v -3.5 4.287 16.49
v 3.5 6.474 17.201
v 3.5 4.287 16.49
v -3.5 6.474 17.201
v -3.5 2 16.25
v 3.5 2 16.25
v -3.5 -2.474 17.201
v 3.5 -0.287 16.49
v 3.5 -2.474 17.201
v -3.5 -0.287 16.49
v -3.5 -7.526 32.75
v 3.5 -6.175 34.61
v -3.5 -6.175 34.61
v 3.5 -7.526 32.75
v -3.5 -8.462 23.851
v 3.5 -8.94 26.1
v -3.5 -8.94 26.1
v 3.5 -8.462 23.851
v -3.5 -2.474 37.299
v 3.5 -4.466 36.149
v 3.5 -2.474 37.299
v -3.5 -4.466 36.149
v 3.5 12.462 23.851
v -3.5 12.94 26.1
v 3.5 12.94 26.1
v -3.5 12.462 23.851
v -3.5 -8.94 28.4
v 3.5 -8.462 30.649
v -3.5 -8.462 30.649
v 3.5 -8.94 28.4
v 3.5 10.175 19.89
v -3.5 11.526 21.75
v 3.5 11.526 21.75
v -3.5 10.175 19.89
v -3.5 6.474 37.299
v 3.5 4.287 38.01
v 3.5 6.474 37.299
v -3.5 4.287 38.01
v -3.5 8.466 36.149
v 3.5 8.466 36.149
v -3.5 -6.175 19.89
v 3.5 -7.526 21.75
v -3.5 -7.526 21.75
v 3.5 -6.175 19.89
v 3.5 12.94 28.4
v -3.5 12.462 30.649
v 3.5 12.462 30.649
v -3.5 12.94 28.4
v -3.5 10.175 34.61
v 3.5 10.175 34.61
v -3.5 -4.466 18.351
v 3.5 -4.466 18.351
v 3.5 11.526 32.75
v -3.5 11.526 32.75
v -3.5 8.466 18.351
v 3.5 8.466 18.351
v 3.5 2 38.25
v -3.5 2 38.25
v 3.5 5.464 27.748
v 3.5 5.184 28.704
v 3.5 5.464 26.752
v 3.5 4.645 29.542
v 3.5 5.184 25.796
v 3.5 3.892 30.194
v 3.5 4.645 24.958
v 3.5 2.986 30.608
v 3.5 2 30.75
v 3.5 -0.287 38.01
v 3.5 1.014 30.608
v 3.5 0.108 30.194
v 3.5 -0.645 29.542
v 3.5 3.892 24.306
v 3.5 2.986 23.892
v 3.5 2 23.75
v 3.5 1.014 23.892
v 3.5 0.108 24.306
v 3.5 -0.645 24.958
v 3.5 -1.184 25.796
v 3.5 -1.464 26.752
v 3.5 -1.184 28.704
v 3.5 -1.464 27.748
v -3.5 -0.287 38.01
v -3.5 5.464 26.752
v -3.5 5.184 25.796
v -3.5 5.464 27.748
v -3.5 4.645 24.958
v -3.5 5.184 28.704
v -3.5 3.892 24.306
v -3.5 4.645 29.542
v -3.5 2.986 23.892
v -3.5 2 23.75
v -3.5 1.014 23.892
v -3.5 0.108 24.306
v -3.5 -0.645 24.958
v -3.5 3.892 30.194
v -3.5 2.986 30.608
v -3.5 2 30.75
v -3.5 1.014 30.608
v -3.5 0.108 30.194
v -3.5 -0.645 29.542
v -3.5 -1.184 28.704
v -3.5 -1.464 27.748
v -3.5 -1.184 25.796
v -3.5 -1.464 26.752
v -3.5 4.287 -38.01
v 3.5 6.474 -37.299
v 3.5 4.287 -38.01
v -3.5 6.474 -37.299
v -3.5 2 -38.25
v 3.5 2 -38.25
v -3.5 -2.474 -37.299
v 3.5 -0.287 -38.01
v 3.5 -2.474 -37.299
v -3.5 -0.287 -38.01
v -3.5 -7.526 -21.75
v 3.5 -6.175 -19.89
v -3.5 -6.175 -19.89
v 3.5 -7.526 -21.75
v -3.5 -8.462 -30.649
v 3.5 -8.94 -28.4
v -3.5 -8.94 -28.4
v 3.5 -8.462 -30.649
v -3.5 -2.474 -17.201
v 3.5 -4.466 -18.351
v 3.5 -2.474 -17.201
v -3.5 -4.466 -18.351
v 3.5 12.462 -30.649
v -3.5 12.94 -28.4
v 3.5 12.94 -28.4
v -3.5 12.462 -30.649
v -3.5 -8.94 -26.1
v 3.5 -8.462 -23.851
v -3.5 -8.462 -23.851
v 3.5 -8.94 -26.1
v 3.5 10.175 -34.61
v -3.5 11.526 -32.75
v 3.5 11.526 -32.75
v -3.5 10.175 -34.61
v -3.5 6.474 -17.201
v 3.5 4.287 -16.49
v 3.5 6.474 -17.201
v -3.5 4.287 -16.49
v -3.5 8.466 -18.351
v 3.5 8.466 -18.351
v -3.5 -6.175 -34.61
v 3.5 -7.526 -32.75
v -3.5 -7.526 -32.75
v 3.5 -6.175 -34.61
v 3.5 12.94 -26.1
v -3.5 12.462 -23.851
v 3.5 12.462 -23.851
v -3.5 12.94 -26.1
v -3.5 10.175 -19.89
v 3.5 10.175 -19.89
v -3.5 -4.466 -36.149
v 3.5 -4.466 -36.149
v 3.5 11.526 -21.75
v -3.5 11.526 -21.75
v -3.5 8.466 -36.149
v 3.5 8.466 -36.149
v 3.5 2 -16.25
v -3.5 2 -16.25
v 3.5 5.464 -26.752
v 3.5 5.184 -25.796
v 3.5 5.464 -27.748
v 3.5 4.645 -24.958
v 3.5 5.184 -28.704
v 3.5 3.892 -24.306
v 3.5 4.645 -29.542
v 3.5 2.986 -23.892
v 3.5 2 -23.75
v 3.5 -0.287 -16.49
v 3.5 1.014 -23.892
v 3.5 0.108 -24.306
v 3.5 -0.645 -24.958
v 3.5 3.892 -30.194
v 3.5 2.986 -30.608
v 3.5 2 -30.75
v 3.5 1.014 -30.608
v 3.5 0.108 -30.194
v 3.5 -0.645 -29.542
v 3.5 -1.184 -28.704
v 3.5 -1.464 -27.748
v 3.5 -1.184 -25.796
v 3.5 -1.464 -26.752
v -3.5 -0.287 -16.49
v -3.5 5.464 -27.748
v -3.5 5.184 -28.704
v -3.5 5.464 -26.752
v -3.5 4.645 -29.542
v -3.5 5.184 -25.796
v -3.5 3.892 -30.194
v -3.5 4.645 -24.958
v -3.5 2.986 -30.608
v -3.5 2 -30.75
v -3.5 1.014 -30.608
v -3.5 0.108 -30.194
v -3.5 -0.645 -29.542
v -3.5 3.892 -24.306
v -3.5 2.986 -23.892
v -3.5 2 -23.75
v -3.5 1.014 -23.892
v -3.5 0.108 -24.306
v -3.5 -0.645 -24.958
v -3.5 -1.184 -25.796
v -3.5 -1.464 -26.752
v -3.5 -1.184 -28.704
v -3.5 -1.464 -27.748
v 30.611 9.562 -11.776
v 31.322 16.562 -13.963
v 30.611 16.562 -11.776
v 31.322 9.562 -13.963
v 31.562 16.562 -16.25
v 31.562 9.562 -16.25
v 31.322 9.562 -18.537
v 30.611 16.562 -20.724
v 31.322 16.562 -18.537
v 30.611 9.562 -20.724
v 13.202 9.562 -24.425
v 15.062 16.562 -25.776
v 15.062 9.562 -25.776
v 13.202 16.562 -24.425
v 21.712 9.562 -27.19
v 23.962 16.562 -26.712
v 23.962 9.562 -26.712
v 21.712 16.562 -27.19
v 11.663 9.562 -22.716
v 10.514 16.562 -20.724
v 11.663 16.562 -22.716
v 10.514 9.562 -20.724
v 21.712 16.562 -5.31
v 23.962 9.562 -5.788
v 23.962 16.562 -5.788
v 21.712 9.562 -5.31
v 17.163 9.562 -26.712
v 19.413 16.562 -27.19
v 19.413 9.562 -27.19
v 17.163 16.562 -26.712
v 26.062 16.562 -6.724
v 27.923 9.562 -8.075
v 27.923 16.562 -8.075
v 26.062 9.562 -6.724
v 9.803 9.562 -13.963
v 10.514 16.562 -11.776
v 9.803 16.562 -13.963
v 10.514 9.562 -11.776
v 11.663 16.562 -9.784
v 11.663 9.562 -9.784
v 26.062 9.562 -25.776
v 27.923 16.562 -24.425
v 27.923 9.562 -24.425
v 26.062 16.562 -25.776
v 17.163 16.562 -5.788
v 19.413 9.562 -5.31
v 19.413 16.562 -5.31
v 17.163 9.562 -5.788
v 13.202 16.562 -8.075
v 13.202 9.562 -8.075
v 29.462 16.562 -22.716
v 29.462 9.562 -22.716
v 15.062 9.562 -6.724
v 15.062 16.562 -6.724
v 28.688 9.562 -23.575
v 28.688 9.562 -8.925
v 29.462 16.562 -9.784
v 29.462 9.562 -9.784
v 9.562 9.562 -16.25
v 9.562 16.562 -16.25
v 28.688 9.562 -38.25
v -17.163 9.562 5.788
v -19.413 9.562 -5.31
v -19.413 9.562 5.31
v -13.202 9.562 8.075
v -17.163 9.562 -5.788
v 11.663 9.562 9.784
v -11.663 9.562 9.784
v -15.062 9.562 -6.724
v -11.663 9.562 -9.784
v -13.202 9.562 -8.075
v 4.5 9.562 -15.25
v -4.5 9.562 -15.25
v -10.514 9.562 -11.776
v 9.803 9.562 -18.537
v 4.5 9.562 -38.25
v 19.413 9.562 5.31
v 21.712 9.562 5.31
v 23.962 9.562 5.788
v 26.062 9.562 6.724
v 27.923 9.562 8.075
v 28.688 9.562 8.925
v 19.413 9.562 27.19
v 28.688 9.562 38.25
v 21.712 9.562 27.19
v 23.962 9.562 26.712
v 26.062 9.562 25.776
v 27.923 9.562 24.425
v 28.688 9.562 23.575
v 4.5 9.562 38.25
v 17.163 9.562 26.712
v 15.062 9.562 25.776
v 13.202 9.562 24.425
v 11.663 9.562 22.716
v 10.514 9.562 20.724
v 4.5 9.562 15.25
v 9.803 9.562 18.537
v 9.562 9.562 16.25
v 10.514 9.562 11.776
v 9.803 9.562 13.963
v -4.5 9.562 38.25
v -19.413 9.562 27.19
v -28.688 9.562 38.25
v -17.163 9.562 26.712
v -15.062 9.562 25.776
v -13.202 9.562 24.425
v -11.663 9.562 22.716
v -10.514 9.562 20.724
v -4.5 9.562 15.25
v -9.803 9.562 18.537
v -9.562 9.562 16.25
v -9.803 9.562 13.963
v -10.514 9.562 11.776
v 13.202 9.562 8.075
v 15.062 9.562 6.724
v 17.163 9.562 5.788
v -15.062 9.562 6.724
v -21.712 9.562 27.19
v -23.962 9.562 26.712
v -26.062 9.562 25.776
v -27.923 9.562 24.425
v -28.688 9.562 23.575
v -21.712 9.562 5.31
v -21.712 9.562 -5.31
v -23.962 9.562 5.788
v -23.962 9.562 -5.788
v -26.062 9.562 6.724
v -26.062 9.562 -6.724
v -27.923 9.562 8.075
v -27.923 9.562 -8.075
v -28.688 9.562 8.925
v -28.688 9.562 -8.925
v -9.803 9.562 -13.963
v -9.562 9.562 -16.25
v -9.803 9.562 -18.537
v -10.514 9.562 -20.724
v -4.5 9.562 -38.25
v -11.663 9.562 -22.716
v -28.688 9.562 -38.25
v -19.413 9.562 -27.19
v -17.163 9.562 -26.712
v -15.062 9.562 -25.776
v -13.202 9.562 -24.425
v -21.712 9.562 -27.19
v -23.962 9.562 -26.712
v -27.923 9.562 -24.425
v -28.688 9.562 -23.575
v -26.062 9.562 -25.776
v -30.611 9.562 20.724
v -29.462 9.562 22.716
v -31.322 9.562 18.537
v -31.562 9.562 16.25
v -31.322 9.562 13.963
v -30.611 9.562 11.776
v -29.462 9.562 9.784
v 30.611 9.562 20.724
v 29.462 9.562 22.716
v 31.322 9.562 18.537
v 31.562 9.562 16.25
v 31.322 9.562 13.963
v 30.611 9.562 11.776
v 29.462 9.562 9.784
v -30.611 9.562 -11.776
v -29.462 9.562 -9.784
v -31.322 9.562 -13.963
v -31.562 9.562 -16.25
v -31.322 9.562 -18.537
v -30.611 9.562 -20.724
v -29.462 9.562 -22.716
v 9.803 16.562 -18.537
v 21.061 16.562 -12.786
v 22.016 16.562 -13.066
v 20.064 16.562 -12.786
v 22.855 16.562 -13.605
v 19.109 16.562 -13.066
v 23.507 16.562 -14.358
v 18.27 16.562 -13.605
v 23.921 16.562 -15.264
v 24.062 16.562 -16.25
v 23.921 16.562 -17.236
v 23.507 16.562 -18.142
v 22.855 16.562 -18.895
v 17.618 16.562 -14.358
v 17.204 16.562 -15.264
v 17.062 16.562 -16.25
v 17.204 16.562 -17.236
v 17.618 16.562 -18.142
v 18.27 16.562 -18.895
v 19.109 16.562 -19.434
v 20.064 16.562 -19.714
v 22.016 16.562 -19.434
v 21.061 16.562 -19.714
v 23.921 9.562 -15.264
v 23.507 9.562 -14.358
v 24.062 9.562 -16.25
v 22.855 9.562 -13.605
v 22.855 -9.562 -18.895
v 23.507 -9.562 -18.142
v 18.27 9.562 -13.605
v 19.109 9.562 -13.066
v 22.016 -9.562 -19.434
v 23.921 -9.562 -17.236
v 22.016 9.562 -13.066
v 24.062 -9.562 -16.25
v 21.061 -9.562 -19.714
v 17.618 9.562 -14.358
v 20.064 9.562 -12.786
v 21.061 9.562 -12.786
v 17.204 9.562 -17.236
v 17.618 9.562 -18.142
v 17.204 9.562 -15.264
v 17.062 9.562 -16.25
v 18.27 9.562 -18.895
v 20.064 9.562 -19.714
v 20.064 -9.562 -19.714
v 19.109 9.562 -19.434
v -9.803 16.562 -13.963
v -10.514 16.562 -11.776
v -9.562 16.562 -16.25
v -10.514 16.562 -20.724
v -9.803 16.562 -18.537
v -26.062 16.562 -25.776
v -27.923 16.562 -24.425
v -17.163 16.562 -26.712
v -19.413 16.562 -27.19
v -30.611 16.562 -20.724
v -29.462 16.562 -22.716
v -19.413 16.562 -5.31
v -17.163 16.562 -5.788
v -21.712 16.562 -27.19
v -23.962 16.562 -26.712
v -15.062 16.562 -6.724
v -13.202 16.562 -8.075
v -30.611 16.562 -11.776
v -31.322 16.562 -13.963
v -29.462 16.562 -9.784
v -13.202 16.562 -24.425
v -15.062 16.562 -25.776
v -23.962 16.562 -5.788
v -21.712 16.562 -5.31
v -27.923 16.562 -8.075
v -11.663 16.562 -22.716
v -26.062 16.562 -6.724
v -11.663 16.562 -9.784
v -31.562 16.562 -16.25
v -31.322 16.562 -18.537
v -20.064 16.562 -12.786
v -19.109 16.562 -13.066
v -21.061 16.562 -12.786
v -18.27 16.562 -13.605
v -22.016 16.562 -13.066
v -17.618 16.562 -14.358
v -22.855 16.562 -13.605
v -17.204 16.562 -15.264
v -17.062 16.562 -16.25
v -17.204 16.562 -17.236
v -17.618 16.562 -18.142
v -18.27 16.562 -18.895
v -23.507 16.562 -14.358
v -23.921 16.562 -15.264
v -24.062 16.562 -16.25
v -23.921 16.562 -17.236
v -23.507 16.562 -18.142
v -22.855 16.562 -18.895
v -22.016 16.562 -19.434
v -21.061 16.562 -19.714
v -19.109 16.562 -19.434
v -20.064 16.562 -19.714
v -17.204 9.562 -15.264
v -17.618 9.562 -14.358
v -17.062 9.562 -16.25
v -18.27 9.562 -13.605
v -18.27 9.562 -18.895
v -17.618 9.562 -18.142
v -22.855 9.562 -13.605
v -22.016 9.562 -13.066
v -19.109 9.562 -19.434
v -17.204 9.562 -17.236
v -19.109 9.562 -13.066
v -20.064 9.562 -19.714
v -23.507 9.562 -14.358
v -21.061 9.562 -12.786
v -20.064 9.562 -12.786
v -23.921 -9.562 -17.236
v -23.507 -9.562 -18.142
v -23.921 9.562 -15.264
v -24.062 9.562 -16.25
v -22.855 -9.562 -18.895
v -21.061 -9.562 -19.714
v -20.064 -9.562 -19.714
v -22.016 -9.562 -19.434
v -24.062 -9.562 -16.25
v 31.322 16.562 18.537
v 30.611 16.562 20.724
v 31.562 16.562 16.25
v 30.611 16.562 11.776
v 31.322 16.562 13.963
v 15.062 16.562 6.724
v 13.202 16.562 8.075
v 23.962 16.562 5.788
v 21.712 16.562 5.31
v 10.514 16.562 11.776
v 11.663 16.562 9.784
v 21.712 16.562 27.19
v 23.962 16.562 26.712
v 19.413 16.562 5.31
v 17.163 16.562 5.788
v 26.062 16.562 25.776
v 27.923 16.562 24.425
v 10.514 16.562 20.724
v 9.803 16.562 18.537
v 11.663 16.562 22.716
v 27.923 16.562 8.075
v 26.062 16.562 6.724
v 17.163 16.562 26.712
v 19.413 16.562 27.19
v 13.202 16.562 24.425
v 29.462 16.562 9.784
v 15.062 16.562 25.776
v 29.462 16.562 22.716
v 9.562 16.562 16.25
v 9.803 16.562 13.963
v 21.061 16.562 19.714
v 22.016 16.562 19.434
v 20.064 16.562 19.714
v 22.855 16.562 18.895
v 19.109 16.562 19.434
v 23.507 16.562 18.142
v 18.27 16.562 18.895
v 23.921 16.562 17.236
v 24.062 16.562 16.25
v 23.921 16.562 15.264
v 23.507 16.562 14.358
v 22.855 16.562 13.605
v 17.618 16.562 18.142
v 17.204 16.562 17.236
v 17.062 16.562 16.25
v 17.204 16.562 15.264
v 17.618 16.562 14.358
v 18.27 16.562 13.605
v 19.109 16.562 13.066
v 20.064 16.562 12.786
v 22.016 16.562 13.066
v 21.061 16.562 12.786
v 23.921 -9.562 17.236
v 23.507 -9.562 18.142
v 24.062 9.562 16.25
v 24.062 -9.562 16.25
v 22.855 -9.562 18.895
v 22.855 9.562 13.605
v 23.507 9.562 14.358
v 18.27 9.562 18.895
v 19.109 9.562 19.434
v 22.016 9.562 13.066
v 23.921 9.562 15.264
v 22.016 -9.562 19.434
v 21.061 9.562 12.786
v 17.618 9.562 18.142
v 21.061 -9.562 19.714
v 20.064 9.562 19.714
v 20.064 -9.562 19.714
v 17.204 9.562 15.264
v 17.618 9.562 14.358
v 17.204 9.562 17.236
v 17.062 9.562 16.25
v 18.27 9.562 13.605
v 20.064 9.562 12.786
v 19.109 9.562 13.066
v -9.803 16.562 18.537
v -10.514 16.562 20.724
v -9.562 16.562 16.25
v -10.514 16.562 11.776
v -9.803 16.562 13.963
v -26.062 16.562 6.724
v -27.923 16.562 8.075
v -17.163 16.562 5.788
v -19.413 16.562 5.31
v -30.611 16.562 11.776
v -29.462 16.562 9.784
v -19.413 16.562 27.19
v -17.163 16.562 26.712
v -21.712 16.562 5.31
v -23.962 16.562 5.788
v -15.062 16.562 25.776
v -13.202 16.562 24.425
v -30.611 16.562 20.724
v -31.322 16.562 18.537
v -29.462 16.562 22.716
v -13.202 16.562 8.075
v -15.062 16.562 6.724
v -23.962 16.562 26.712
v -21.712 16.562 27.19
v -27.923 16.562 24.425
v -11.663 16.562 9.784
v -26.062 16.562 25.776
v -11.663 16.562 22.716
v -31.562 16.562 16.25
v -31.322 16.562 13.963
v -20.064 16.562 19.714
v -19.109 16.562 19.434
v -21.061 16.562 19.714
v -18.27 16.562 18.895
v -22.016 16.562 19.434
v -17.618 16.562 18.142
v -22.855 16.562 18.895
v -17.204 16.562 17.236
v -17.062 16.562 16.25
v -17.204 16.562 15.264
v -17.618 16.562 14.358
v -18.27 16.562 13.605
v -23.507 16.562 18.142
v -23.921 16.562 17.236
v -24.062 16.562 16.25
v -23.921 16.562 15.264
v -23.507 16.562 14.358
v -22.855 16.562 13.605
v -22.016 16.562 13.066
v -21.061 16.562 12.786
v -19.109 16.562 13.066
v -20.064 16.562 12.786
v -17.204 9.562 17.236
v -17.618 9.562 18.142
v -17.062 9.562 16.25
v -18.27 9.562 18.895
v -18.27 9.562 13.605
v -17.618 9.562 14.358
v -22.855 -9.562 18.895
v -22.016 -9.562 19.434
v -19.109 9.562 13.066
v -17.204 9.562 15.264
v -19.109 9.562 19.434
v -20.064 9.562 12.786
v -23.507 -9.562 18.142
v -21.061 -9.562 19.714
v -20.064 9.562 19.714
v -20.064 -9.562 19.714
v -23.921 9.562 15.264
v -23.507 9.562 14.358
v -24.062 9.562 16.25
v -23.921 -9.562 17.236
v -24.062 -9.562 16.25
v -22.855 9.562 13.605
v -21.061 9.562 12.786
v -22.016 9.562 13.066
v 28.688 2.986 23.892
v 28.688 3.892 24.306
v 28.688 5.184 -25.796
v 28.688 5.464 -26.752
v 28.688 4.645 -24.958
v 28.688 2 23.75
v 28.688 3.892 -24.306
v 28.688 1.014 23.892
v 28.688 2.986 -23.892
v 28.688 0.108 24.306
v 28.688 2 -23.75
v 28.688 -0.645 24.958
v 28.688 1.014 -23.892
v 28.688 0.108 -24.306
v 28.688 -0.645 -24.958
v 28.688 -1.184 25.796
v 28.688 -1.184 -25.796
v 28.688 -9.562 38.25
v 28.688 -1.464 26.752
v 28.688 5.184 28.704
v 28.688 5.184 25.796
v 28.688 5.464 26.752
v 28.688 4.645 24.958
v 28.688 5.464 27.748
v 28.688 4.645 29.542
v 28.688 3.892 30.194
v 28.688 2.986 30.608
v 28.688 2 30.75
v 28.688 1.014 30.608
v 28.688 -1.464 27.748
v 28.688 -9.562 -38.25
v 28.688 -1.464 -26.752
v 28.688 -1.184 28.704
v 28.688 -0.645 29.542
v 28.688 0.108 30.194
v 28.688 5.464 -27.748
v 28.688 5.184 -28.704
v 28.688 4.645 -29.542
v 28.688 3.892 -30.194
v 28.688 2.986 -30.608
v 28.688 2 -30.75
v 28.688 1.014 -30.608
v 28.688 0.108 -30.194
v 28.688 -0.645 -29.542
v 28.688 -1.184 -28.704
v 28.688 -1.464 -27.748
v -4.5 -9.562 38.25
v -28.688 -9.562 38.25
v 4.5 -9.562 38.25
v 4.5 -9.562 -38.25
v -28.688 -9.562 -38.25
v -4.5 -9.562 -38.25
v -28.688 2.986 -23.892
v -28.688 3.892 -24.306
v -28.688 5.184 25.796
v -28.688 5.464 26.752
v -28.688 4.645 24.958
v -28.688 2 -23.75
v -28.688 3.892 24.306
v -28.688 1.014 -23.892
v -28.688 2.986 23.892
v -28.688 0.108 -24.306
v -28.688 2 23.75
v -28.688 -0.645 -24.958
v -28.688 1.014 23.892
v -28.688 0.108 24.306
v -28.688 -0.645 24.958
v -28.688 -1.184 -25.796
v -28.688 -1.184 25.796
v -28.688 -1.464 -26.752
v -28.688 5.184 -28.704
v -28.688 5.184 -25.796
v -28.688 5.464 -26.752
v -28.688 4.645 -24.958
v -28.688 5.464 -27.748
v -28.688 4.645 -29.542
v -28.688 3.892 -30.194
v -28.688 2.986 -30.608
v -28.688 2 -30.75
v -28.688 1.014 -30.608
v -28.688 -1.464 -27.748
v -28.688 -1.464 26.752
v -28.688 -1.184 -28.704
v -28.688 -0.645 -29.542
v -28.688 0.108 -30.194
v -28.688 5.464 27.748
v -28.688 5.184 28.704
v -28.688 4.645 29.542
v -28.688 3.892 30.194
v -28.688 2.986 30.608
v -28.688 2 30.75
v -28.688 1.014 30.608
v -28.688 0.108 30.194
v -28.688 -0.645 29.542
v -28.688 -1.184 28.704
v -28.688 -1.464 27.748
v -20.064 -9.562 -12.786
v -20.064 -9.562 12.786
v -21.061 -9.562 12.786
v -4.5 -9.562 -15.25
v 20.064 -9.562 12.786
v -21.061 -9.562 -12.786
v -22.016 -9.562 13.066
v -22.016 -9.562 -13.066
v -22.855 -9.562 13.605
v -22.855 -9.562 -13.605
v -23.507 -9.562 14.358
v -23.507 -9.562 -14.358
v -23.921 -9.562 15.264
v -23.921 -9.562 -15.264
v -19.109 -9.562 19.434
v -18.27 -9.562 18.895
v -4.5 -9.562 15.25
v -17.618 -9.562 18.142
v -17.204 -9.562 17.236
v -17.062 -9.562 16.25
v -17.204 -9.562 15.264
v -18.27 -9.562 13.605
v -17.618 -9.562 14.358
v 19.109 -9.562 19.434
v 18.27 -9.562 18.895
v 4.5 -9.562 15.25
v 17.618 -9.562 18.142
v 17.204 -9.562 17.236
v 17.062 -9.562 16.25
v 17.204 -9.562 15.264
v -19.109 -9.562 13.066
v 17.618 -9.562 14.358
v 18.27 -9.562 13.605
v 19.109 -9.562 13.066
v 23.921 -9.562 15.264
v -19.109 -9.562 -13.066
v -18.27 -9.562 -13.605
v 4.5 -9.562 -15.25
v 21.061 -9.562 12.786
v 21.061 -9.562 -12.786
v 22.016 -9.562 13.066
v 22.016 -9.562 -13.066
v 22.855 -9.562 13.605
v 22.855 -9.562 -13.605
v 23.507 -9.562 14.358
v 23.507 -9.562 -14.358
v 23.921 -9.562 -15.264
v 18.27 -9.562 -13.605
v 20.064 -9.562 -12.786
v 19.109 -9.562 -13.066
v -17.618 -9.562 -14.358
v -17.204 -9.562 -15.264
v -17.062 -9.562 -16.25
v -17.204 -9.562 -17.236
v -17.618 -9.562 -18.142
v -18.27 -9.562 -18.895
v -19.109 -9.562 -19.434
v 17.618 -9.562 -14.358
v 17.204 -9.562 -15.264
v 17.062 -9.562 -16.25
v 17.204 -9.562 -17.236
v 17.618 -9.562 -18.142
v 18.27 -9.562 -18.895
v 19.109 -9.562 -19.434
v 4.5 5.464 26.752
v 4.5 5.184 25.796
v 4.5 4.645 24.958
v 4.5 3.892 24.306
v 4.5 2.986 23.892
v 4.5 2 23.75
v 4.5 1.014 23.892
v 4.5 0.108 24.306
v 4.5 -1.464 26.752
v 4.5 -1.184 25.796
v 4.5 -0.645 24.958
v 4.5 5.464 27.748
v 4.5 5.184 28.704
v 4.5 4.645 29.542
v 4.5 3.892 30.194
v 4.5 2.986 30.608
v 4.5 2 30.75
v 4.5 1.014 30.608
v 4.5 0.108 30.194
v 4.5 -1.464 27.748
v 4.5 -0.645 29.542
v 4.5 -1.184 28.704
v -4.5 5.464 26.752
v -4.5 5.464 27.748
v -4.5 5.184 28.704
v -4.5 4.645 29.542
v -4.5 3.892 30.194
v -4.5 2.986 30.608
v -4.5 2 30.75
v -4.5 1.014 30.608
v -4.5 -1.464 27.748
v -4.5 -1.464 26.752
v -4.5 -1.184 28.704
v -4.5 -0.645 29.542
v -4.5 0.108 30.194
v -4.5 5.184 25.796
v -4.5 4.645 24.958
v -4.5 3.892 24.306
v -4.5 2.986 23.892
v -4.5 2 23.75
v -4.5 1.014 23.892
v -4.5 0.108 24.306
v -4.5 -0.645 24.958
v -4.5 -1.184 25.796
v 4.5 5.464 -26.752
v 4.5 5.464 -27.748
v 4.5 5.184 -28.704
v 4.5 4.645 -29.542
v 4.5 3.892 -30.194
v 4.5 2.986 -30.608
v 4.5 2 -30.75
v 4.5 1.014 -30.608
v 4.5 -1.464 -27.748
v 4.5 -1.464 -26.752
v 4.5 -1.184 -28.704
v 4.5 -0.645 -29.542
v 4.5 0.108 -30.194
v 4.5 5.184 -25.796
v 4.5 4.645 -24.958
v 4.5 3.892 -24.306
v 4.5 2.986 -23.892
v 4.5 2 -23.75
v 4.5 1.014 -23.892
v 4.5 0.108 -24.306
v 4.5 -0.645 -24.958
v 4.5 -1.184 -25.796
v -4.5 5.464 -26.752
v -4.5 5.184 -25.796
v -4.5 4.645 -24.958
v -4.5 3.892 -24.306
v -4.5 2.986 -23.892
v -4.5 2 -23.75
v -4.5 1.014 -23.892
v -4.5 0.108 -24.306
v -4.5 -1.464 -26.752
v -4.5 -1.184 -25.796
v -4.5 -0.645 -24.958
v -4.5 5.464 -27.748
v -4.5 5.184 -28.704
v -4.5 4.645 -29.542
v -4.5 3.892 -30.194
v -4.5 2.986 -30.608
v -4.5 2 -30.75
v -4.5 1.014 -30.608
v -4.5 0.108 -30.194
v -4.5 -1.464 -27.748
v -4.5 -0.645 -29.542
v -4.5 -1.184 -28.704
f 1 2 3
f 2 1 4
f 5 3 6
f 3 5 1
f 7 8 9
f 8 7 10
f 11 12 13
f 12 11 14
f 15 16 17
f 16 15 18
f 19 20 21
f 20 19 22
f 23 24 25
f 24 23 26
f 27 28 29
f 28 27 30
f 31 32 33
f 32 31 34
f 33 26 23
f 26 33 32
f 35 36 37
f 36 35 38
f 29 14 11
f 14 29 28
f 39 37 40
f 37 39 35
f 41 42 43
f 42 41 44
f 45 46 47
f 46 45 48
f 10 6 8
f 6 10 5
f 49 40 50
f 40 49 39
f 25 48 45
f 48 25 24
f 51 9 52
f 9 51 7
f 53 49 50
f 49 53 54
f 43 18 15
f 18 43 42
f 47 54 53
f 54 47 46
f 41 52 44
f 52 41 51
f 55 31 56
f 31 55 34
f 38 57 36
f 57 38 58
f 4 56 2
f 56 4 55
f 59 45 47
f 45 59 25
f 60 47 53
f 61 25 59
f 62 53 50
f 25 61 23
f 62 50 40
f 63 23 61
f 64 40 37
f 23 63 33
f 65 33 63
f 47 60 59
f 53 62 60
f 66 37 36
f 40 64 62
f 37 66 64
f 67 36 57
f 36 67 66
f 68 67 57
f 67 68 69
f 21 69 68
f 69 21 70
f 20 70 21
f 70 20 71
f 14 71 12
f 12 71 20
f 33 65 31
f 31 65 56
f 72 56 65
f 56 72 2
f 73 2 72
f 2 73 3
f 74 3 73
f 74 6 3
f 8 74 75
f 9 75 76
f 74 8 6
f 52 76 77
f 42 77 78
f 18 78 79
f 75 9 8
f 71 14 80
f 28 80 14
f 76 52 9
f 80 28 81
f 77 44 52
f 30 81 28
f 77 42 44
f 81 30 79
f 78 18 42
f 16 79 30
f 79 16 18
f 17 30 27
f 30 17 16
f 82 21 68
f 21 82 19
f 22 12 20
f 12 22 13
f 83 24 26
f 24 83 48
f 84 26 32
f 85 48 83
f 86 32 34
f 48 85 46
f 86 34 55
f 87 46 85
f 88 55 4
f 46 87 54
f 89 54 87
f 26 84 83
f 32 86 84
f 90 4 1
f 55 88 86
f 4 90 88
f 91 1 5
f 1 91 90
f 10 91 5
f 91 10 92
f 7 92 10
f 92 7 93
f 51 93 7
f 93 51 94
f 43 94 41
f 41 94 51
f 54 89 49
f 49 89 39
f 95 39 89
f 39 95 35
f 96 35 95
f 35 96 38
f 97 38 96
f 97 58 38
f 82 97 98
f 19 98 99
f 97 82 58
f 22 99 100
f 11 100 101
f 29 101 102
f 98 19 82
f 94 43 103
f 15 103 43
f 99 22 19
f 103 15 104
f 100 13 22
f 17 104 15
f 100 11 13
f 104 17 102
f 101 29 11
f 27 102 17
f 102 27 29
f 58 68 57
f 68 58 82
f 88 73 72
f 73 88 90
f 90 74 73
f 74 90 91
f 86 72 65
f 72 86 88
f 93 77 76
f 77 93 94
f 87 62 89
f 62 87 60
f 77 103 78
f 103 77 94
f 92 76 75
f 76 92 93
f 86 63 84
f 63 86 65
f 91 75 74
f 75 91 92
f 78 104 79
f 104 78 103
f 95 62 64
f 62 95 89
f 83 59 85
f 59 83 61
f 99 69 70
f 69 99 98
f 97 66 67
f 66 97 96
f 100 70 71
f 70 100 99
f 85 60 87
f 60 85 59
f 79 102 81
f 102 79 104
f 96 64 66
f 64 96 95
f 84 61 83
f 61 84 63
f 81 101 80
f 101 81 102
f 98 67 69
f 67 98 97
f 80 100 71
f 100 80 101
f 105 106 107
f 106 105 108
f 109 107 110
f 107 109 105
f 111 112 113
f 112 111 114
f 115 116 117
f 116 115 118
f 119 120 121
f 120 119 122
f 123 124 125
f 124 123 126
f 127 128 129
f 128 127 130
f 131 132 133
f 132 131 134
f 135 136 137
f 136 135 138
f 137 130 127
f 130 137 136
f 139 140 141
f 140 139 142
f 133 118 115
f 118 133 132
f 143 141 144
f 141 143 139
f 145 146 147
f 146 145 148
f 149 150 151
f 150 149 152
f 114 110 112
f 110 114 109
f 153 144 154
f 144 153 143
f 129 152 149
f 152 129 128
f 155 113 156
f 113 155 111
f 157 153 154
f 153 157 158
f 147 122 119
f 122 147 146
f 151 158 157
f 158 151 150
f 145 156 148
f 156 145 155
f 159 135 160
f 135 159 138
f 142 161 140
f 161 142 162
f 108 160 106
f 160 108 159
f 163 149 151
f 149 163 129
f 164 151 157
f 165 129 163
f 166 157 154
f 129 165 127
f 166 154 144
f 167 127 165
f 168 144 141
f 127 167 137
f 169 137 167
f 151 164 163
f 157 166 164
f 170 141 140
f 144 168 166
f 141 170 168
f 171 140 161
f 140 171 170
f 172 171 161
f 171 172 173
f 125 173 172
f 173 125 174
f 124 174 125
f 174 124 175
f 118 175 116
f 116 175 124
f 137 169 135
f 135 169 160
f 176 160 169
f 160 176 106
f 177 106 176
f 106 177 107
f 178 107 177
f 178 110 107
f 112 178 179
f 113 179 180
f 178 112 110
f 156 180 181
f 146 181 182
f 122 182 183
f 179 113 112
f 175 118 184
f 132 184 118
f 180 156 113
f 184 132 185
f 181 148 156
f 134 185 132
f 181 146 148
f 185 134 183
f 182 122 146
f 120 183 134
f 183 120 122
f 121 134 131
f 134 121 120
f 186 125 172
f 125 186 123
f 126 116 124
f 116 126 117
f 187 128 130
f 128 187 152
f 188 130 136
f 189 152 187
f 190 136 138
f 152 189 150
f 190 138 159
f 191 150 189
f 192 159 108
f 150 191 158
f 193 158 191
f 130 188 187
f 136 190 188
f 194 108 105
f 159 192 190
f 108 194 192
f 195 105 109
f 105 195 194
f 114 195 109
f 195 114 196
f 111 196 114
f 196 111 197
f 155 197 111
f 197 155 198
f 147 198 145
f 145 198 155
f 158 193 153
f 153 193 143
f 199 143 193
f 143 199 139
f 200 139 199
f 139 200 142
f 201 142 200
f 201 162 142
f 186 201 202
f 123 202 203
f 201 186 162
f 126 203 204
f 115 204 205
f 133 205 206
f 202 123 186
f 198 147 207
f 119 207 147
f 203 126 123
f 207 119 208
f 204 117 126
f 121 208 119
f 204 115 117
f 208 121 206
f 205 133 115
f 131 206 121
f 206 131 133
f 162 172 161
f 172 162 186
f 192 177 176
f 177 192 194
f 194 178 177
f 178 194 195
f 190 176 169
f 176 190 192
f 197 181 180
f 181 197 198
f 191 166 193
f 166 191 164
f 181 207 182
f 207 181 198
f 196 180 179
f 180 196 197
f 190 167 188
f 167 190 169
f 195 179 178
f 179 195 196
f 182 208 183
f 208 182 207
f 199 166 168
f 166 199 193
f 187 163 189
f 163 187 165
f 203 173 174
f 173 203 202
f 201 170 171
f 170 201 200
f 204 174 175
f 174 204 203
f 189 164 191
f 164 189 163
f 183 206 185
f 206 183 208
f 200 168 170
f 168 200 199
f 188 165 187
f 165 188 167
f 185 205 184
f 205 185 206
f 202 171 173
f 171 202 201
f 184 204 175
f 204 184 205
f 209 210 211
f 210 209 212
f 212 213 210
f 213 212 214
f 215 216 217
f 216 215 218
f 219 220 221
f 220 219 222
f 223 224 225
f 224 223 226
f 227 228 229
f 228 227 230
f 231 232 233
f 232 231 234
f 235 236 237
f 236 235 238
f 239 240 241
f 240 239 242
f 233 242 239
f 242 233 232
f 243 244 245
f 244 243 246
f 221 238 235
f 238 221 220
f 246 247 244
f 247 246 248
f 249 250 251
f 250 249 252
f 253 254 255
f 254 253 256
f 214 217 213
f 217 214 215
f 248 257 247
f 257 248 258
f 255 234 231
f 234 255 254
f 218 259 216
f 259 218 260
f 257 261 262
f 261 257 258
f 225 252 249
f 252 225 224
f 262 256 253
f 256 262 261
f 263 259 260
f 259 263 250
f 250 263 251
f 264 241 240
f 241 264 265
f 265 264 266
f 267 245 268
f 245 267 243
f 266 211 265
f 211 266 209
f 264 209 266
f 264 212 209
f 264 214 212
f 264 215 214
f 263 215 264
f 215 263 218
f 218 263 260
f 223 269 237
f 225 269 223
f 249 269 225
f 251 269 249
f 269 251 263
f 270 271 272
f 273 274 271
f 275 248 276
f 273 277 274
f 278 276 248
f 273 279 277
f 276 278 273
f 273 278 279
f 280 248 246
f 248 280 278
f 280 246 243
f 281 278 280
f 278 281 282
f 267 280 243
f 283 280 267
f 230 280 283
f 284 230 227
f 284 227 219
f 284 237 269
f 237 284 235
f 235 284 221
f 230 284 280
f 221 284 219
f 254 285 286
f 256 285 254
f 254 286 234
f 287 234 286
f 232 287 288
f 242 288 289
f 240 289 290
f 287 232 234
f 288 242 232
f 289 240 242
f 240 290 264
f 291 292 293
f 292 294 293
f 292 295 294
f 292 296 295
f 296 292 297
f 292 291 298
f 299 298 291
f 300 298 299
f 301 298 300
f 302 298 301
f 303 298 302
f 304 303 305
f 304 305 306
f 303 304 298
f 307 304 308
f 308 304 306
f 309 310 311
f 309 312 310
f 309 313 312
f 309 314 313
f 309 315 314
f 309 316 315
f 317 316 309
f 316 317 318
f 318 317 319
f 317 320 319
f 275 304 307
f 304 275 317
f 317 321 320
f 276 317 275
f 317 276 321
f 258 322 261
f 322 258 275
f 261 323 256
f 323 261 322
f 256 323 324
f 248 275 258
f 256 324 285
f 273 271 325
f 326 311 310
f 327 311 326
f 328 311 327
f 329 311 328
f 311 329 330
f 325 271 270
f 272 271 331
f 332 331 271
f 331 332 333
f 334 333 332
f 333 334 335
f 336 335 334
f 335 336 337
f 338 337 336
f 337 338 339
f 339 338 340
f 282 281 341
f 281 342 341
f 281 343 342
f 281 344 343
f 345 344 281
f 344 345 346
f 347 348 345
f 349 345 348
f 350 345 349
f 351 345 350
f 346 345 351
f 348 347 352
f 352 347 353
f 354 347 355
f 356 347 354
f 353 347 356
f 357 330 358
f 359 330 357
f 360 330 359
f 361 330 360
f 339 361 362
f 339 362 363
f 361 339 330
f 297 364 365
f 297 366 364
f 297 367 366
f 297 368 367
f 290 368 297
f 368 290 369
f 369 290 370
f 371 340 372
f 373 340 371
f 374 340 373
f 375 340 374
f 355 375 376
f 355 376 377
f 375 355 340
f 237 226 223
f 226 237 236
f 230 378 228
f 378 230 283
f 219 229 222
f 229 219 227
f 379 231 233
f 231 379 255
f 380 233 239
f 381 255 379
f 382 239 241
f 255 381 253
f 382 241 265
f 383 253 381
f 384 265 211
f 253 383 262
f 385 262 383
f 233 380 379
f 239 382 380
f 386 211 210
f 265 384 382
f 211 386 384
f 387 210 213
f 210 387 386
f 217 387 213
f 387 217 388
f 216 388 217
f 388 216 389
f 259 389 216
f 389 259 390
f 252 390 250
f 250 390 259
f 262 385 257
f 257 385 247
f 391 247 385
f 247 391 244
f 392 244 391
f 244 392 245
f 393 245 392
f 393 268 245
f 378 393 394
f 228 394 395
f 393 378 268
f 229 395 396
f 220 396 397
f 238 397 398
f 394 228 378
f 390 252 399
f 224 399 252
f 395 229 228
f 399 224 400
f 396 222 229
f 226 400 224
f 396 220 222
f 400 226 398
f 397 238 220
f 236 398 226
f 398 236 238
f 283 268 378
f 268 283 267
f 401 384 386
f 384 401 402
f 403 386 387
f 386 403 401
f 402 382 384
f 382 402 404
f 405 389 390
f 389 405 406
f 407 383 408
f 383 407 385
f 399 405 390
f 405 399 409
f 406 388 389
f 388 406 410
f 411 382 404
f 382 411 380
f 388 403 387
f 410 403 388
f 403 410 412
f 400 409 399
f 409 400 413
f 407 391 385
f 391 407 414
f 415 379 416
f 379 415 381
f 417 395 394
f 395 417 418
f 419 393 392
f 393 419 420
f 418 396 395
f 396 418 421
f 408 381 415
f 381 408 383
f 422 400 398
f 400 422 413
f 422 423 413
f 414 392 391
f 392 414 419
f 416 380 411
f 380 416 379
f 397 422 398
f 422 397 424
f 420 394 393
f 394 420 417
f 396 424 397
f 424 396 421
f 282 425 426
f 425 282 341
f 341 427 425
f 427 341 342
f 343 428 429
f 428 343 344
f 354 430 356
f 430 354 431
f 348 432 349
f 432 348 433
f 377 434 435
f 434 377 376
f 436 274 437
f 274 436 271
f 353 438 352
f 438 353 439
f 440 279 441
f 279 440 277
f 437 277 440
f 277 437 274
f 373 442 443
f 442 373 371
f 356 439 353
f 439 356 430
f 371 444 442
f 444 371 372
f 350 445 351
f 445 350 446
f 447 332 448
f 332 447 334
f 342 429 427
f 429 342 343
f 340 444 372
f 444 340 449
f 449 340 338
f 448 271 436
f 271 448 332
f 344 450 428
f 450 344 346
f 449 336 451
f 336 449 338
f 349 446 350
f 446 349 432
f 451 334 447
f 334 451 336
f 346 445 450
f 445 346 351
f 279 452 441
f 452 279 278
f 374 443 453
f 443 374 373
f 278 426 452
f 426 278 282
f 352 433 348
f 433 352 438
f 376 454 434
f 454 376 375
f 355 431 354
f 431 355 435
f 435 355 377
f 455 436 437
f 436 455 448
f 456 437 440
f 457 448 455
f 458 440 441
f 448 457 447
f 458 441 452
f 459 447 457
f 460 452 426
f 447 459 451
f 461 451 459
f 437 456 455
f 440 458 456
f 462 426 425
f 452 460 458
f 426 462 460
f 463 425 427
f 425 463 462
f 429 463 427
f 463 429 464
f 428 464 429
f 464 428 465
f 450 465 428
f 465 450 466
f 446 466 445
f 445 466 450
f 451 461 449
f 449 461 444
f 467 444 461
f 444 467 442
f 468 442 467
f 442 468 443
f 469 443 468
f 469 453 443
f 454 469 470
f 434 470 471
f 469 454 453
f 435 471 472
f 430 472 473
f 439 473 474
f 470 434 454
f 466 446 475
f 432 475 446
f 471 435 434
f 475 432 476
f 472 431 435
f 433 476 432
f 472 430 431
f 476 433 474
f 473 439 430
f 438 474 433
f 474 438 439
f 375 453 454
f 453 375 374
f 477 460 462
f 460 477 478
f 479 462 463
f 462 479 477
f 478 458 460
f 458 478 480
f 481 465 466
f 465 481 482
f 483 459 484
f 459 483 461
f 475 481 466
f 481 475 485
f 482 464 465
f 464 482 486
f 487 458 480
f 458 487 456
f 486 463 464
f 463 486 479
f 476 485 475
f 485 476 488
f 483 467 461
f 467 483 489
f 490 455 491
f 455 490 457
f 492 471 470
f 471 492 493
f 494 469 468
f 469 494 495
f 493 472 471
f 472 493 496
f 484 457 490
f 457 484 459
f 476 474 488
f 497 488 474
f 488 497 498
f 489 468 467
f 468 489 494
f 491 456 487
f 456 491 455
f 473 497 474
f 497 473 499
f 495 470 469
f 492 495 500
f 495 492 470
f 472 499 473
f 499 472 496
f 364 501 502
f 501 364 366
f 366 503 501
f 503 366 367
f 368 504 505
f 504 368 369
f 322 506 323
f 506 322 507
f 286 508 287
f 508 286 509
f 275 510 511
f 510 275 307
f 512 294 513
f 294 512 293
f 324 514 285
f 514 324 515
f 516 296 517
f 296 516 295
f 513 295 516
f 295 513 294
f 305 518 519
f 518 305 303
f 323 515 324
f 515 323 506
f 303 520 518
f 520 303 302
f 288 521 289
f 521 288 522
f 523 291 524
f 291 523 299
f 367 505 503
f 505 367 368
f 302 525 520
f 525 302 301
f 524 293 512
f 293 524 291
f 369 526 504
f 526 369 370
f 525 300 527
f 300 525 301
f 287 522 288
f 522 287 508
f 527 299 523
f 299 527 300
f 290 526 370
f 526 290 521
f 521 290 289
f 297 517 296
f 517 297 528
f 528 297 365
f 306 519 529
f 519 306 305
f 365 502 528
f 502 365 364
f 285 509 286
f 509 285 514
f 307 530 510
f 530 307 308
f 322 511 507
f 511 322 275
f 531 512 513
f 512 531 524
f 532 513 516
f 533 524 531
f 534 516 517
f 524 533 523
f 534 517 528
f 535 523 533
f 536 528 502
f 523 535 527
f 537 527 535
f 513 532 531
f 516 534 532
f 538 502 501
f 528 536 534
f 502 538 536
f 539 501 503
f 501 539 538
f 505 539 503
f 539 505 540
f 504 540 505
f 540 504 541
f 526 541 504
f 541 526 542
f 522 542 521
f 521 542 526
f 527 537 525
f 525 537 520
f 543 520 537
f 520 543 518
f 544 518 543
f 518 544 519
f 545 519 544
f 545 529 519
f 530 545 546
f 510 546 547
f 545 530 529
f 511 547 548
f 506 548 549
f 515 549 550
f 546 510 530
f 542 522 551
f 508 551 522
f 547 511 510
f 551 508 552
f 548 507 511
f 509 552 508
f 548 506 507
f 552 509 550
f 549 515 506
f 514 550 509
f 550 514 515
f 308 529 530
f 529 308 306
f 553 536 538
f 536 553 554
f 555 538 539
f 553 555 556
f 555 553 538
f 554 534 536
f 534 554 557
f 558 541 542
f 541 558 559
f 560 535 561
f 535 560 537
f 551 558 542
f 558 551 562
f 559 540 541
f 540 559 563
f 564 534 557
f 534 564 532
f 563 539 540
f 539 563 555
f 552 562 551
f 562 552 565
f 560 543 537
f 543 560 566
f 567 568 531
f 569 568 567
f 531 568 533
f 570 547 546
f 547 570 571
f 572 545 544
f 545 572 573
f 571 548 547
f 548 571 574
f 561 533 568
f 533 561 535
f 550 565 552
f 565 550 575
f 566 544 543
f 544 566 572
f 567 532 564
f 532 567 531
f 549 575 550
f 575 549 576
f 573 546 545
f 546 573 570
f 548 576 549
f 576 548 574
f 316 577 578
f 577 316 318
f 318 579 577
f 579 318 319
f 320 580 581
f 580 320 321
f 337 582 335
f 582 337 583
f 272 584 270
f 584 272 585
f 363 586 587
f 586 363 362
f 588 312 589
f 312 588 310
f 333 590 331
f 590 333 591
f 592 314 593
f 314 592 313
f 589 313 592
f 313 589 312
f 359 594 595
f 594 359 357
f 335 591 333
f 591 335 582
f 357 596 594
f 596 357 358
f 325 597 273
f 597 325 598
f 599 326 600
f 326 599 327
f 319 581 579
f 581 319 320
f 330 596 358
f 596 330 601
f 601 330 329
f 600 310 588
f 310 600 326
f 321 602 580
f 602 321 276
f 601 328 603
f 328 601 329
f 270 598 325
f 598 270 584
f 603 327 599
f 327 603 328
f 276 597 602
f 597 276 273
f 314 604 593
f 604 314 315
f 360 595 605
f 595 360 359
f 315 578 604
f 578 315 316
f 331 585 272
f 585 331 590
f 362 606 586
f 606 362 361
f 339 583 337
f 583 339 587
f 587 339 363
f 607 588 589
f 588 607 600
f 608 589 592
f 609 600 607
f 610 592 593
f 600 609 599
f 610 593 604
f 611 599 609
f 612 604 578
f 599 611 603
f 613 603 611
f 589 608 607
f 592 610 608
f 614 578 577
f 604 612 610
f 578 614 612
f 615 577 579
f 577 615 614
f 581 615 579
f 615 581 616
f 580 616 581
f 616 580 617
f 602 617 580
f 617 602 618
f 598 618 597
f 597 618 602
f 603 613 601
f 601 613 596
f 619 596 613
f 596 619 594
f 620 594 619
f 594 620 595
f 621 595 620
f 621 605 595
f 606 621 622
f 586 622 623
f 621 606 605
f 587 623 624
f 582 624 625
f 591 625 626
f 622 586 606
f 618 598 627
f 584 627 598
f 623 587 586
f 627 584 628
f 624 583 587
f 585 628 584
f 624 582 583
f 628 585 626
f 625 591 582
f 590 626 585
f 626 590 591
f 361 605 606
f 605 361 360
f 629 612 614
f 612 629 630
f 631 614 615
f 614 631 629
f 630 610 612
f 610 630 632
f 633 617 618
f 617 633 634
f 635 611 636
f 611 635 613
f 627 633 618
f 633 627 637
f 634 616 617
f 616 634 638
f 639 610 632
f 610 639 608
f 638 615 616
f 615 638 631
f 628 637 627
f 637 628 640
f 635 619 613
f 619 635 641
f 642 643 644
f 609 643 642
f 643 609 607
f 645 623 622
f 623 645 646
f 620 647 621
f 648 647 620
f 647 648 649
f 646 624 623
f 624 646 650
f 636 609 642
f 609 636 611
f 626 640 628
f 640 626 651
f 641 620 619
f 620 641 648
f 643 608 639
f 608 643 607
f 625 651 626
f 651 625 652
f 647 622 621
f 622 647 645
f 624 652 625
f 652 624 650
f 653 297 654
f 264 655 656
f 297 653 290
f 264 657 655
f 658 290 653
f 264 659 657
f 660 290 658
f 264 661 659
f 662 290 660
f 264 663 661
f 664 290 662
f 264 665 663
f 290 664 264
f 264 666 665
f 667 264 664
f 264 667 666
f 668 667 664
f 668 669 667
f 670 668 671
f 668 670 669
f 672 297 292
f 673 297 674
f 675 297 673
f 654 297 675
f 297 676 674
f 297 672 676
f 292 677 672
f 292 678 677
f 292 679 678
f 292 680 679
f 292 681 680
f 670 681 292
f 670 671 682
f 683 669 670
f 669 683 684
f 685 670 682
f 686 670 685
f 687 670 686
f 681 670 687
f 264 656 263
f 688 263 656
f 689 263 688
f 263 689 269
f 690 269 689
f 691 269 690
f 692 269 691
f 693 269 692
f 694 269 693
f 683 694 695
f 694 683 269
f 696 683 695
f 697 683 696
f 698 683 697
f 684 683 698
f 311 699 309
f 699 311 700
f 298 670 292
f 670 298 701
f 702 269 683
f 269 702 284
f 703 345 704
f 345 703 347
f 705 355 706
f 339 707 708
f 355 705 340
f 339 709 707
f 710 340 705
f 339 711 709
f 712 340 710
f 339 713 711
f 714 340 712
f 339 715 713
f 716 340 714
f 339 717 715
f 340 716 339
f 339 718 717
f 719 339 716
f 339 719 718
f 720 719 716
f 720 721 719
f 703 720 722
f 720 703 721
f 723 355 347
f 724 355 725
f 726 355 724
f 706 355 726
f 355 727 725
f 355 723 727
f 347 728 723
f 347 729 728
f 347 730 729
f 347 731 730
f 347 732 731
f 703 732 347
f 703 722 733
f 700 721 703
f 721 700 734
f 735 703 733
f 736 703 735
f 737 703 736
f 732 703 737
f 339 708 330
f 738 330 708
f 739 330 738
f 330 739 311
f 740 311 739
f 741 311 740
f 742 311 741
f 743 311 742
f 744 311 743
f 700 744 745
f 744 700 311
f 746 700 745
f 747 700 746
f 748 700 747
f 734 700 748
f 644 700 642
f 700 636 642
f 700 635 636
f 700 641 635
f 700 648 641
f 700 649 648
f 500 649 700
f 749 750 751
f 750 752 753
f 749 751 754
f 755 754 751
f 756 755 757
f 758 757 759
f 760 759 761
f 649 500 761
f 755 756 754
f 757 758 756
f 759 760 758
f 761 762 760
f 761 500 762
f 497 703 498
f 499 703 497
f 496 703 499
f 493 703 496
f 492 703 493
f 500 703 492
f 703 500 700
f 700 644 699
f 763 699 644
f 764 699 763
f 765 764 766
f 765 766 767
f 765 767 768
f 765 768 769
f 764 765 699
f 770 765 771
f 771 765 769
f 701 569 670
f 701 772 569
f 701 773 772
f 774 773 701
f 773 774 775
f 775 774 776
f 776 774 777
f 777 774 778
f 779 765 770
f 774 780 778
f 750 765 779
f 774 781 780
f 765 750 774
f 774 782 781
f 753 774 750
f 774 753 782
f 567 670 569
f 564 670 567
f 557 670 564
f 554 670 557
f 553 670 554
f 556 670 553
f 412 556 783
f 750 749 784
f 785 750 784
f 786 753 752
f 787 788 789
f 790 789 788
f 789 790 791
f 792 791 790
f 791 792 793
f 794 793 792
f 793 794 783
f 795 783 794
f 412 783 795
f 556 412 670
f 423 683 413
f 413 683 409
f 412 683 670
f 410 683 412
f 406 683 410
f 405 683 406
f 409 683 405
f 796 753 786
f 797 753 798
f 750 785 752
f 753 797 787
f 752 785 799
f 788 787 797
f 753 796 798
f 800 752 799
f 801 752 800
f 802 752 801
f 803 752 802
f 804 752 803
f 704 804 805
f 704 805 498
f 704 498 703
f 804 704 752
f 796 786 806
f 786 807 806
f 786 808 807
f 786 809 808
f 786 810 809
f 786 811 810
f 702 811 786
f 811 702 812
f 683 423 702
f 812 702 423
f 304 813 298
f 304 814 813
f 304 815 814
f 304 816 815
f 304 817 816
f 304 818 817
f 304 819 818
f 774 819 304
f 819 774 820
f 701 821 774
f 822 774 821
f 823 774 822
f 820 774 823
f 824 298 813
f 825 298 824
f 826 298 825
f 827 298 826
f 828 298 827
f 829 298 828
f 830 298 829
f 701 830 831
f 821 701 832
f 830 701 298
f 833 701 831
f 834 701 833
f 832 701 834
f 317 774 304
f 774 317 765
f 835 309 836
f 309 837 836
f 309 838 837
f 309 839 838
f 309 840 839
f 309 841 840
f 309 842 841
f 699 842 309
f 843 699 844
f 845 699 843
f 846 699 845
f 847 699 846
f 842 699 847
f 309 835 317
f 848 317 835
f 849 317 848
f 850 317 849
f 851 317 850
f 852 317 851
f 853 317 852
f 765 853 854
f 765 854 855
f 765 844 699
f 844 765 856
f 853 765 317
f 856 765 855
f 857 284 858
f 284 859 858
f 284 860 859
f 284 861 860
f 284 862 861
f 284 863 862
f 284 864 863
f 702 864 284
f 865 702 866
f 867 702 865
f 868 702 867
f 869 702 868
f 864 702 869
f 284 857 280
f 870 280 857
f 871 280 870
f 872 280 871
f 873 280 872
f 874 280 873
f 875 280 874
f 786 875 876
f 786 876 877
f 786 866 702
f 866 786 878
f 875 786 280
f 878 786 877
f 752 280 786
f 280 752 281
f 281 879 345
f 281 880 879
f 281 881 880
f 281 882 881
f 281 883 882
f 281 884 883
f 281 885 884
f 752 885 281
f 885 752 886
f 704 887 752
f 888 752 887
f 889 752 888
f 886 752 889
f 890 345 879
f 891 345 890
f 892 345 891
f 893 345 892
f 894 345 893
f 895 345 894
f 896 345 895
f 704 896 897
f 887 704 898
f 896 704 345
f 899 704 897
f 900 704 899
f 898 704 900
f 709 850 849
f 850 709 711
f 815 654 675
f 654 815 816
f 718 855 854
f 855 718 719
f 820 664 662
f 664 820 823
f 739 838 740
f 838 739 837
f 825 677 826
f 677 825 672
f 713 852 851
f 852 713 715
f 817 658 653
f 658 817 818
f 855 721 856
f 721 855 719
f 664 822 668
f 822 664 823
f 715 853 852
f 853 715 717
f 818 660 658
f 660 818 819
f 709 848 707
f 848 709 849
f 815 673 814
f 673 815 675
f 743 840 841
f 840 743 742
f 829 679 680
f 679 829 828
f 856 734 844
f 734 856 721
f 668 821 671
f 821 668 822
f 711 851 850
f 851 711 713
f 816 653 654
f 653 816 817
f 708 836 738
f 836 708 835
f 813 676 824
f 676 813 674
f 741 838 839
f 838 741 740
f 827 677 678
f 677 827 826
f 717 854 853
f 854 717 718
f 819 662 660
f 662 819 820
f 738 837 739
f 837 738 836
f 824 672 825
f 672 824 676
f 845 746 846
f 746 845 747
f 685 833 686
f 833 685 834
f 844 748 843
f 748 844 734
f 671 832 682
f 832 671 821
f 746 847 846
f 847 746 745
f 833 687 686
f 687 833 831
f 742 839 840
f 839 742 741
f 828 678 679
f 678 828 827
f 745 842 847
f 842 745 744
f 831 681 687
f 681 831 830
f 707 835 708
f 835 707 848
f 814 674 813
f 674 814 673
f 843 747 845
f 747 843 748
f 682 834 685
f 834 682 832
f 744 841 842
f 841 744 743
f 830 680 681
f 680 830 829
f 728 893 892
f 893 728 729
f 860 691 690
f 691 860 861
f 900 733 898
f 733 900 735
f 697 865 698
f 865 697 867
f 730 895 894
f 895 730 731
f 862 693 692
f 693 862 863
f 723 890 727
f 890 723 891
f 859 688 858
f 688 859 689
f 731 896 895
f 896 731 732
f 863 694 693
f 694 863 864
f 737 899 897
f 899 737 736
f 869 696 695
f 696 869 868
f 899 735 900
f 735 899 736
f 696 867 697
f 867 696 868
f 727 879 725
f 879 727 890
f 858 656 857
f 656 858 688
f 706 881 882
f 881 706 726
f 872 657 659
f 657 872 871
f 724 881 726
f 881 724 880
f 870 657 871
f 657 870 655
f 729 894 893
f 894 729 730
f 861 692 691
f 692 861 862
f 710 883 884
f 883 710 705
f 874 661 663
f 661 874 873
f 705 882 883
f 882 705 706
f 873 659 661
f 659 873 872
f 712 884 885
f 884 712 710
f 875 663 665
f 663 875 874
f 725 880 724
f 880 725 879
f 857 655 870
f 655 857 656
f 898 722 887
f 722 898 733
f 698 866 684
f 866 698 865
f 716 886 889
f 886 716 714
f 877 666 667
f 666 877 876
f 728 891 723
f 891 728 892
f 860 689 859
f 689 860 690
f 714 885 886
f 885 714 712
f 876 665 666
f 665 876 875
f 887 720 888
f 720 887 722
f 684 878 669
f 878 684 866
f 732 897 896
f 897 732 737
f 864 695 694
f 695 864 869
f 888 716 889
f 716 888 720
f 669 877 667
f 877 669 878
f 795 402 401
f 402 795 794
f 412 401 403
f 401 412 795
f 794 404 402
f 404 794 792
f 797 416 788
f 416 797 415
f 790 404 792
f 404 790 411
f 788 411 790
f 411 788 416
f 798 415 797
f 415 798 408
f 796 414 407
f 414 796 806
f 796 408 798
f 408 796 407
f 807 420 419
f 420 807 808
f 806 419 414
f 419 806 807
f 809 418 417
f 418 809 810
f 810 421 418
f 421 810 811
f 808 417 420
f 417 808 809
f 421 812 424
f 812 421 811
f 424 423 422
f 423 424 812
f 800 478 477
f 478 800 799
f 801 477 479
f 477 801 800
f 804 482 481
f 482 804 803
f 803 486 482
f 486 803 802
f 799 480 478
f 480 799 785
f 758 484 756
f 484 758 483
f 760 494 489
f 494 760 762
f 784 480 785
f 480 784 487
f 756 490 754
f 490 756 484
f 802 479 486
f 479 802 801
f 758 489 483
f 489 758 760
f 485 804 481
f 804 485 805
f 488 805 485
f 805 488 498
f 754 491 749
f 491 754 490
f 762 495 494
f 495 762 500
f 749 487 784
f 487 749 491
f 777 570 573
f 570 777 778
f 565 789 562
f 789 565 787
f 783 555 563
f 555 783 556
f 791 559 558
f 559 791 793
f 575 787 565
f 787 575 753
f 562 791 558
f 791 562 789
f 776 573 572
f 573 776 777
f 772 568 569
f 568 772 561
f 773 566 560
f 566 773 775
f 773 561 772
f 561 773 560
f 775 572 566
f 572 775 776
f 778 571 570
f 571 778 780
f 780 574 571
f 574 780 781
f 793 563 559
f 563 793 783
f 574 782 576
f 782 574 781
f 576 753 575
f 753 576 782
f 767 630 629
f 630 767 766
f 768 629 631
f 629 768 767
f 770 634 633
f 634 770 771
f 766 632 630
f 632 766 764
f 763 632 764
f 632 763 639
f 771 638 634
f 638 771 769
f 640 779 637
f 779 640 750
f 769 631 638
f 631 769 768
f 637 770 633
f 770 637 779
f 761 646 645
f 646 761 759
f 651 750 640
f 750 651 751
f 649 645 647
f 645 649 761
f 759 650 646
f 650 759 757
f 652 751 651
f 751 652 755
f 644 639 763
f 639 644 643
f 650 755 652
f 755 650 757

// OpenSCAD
function mm_from_inches(inches) = inches*25.5;


bearing_od = 22;
bearing_id   = 8;
bearing_w   = 7;

slidew =  mm_from_inches(.75);

runnerheight = mm_from_inches(3);
runnerdepth  = mm_from_inches(.75);
runnerwidth =  mm_from_inches(2.25);

module bearingnotch()
{
  cube(size =[bearing_w+ 2, mm_from_inches(1), bearing_od+6], center = true); 
}

module bolt()
{
	cylinder(h=100, r=3.5, center=true, $fs=1);
}

module bearing()
{
    color([0, 0, .7, 1]) {	
    difference() {
	cylinder(h=7, r=11, center=true, $fs=1);
	bolt();
   }
}
}

b1trans = [0, 2, runnerheight/2 - bearing_od/2];
b2trans = [0, 2, -runnerheight/2 + bearing_od/2];
b3trans = [slidew/2 + bearing_od/2, runnerdepth/2 + bearing_w/2, -runnerheight/2 + bearing_od];
b4trans = [-slidew/2 - bearing_od/2, runnerdepth/2 + bearing_w/2, -runnerheight/2 + bearing_od];
b5trans = [slidew/2 +  bearing_od/2, runnerdepth/2 + bearing_w/2, runnerheight/2 - bearing_od];
b6trans = [-slidew/2 - bearing_od/2, runnerdepth/2 + bearing_w/2, runnerheight/2 - bearing_od];

echo("======================================================");
echo(str("  Long holes @ ", runnerdepth/2 - b1trans[1], "mm from front, ", runnerheight/2- b1trans[2], "mm from top"));
echo(str("  Short holes @ ", runnerwidth/2 - b3trans[0], "mm from edge, ", runnerheight/2- b3trans[2], "mm from top"));
echo("======================================================");


translate(v=b1trans) rotate(90, [0,1, 0])  { bearing(); } 
translate(v=b2trans) rotate(90, [0,1, 0])  { bearing(); } 
translate(v=b3trans) rotate(90, [1,0, 0])  { bearing(); } 
translate(v=b4trans) rotate(90, [1,0, 0])  { bearing(); } 
translate(v=b5trans) rotate(90, [1,0, 0])  { bearing(); } 
translate(v=b6trans) rotate(90, [1,0, 0])  { bearing(); } 

	

module body()
{
          offset = 2 + runnerheight/2 - bearing_od/2;

	difference() {
		cube(size =[runnerwidth, runnerdepth, runnerheight], center = true);
		translate(v = [0, 0, offset] ) { bearingnotch(); }
		translate(v = [0, 0, -offset] ) { bearingnotch(); }
	
		//drill holes
		translate(v=b1trans) rotate(90, [0,1, 0])  { bolt(); } 
		translate(v=b2trans) rotate(90, [0,1, 0])  { bolt(); } 
		translate(v=b3trans) rotate(90, [1,0, 0])  { bolt(); } 
		translate(v=b4trans) rotate(90, [1,0, 0])  { bolt(); } 
		translate(v=b5trans) rotate(90, [1,0, 0])  { bolt(); } 
		translate(v=b6trans) rotate(90, [1,0, 0])  { bolt(); } 

	}
}

body();
